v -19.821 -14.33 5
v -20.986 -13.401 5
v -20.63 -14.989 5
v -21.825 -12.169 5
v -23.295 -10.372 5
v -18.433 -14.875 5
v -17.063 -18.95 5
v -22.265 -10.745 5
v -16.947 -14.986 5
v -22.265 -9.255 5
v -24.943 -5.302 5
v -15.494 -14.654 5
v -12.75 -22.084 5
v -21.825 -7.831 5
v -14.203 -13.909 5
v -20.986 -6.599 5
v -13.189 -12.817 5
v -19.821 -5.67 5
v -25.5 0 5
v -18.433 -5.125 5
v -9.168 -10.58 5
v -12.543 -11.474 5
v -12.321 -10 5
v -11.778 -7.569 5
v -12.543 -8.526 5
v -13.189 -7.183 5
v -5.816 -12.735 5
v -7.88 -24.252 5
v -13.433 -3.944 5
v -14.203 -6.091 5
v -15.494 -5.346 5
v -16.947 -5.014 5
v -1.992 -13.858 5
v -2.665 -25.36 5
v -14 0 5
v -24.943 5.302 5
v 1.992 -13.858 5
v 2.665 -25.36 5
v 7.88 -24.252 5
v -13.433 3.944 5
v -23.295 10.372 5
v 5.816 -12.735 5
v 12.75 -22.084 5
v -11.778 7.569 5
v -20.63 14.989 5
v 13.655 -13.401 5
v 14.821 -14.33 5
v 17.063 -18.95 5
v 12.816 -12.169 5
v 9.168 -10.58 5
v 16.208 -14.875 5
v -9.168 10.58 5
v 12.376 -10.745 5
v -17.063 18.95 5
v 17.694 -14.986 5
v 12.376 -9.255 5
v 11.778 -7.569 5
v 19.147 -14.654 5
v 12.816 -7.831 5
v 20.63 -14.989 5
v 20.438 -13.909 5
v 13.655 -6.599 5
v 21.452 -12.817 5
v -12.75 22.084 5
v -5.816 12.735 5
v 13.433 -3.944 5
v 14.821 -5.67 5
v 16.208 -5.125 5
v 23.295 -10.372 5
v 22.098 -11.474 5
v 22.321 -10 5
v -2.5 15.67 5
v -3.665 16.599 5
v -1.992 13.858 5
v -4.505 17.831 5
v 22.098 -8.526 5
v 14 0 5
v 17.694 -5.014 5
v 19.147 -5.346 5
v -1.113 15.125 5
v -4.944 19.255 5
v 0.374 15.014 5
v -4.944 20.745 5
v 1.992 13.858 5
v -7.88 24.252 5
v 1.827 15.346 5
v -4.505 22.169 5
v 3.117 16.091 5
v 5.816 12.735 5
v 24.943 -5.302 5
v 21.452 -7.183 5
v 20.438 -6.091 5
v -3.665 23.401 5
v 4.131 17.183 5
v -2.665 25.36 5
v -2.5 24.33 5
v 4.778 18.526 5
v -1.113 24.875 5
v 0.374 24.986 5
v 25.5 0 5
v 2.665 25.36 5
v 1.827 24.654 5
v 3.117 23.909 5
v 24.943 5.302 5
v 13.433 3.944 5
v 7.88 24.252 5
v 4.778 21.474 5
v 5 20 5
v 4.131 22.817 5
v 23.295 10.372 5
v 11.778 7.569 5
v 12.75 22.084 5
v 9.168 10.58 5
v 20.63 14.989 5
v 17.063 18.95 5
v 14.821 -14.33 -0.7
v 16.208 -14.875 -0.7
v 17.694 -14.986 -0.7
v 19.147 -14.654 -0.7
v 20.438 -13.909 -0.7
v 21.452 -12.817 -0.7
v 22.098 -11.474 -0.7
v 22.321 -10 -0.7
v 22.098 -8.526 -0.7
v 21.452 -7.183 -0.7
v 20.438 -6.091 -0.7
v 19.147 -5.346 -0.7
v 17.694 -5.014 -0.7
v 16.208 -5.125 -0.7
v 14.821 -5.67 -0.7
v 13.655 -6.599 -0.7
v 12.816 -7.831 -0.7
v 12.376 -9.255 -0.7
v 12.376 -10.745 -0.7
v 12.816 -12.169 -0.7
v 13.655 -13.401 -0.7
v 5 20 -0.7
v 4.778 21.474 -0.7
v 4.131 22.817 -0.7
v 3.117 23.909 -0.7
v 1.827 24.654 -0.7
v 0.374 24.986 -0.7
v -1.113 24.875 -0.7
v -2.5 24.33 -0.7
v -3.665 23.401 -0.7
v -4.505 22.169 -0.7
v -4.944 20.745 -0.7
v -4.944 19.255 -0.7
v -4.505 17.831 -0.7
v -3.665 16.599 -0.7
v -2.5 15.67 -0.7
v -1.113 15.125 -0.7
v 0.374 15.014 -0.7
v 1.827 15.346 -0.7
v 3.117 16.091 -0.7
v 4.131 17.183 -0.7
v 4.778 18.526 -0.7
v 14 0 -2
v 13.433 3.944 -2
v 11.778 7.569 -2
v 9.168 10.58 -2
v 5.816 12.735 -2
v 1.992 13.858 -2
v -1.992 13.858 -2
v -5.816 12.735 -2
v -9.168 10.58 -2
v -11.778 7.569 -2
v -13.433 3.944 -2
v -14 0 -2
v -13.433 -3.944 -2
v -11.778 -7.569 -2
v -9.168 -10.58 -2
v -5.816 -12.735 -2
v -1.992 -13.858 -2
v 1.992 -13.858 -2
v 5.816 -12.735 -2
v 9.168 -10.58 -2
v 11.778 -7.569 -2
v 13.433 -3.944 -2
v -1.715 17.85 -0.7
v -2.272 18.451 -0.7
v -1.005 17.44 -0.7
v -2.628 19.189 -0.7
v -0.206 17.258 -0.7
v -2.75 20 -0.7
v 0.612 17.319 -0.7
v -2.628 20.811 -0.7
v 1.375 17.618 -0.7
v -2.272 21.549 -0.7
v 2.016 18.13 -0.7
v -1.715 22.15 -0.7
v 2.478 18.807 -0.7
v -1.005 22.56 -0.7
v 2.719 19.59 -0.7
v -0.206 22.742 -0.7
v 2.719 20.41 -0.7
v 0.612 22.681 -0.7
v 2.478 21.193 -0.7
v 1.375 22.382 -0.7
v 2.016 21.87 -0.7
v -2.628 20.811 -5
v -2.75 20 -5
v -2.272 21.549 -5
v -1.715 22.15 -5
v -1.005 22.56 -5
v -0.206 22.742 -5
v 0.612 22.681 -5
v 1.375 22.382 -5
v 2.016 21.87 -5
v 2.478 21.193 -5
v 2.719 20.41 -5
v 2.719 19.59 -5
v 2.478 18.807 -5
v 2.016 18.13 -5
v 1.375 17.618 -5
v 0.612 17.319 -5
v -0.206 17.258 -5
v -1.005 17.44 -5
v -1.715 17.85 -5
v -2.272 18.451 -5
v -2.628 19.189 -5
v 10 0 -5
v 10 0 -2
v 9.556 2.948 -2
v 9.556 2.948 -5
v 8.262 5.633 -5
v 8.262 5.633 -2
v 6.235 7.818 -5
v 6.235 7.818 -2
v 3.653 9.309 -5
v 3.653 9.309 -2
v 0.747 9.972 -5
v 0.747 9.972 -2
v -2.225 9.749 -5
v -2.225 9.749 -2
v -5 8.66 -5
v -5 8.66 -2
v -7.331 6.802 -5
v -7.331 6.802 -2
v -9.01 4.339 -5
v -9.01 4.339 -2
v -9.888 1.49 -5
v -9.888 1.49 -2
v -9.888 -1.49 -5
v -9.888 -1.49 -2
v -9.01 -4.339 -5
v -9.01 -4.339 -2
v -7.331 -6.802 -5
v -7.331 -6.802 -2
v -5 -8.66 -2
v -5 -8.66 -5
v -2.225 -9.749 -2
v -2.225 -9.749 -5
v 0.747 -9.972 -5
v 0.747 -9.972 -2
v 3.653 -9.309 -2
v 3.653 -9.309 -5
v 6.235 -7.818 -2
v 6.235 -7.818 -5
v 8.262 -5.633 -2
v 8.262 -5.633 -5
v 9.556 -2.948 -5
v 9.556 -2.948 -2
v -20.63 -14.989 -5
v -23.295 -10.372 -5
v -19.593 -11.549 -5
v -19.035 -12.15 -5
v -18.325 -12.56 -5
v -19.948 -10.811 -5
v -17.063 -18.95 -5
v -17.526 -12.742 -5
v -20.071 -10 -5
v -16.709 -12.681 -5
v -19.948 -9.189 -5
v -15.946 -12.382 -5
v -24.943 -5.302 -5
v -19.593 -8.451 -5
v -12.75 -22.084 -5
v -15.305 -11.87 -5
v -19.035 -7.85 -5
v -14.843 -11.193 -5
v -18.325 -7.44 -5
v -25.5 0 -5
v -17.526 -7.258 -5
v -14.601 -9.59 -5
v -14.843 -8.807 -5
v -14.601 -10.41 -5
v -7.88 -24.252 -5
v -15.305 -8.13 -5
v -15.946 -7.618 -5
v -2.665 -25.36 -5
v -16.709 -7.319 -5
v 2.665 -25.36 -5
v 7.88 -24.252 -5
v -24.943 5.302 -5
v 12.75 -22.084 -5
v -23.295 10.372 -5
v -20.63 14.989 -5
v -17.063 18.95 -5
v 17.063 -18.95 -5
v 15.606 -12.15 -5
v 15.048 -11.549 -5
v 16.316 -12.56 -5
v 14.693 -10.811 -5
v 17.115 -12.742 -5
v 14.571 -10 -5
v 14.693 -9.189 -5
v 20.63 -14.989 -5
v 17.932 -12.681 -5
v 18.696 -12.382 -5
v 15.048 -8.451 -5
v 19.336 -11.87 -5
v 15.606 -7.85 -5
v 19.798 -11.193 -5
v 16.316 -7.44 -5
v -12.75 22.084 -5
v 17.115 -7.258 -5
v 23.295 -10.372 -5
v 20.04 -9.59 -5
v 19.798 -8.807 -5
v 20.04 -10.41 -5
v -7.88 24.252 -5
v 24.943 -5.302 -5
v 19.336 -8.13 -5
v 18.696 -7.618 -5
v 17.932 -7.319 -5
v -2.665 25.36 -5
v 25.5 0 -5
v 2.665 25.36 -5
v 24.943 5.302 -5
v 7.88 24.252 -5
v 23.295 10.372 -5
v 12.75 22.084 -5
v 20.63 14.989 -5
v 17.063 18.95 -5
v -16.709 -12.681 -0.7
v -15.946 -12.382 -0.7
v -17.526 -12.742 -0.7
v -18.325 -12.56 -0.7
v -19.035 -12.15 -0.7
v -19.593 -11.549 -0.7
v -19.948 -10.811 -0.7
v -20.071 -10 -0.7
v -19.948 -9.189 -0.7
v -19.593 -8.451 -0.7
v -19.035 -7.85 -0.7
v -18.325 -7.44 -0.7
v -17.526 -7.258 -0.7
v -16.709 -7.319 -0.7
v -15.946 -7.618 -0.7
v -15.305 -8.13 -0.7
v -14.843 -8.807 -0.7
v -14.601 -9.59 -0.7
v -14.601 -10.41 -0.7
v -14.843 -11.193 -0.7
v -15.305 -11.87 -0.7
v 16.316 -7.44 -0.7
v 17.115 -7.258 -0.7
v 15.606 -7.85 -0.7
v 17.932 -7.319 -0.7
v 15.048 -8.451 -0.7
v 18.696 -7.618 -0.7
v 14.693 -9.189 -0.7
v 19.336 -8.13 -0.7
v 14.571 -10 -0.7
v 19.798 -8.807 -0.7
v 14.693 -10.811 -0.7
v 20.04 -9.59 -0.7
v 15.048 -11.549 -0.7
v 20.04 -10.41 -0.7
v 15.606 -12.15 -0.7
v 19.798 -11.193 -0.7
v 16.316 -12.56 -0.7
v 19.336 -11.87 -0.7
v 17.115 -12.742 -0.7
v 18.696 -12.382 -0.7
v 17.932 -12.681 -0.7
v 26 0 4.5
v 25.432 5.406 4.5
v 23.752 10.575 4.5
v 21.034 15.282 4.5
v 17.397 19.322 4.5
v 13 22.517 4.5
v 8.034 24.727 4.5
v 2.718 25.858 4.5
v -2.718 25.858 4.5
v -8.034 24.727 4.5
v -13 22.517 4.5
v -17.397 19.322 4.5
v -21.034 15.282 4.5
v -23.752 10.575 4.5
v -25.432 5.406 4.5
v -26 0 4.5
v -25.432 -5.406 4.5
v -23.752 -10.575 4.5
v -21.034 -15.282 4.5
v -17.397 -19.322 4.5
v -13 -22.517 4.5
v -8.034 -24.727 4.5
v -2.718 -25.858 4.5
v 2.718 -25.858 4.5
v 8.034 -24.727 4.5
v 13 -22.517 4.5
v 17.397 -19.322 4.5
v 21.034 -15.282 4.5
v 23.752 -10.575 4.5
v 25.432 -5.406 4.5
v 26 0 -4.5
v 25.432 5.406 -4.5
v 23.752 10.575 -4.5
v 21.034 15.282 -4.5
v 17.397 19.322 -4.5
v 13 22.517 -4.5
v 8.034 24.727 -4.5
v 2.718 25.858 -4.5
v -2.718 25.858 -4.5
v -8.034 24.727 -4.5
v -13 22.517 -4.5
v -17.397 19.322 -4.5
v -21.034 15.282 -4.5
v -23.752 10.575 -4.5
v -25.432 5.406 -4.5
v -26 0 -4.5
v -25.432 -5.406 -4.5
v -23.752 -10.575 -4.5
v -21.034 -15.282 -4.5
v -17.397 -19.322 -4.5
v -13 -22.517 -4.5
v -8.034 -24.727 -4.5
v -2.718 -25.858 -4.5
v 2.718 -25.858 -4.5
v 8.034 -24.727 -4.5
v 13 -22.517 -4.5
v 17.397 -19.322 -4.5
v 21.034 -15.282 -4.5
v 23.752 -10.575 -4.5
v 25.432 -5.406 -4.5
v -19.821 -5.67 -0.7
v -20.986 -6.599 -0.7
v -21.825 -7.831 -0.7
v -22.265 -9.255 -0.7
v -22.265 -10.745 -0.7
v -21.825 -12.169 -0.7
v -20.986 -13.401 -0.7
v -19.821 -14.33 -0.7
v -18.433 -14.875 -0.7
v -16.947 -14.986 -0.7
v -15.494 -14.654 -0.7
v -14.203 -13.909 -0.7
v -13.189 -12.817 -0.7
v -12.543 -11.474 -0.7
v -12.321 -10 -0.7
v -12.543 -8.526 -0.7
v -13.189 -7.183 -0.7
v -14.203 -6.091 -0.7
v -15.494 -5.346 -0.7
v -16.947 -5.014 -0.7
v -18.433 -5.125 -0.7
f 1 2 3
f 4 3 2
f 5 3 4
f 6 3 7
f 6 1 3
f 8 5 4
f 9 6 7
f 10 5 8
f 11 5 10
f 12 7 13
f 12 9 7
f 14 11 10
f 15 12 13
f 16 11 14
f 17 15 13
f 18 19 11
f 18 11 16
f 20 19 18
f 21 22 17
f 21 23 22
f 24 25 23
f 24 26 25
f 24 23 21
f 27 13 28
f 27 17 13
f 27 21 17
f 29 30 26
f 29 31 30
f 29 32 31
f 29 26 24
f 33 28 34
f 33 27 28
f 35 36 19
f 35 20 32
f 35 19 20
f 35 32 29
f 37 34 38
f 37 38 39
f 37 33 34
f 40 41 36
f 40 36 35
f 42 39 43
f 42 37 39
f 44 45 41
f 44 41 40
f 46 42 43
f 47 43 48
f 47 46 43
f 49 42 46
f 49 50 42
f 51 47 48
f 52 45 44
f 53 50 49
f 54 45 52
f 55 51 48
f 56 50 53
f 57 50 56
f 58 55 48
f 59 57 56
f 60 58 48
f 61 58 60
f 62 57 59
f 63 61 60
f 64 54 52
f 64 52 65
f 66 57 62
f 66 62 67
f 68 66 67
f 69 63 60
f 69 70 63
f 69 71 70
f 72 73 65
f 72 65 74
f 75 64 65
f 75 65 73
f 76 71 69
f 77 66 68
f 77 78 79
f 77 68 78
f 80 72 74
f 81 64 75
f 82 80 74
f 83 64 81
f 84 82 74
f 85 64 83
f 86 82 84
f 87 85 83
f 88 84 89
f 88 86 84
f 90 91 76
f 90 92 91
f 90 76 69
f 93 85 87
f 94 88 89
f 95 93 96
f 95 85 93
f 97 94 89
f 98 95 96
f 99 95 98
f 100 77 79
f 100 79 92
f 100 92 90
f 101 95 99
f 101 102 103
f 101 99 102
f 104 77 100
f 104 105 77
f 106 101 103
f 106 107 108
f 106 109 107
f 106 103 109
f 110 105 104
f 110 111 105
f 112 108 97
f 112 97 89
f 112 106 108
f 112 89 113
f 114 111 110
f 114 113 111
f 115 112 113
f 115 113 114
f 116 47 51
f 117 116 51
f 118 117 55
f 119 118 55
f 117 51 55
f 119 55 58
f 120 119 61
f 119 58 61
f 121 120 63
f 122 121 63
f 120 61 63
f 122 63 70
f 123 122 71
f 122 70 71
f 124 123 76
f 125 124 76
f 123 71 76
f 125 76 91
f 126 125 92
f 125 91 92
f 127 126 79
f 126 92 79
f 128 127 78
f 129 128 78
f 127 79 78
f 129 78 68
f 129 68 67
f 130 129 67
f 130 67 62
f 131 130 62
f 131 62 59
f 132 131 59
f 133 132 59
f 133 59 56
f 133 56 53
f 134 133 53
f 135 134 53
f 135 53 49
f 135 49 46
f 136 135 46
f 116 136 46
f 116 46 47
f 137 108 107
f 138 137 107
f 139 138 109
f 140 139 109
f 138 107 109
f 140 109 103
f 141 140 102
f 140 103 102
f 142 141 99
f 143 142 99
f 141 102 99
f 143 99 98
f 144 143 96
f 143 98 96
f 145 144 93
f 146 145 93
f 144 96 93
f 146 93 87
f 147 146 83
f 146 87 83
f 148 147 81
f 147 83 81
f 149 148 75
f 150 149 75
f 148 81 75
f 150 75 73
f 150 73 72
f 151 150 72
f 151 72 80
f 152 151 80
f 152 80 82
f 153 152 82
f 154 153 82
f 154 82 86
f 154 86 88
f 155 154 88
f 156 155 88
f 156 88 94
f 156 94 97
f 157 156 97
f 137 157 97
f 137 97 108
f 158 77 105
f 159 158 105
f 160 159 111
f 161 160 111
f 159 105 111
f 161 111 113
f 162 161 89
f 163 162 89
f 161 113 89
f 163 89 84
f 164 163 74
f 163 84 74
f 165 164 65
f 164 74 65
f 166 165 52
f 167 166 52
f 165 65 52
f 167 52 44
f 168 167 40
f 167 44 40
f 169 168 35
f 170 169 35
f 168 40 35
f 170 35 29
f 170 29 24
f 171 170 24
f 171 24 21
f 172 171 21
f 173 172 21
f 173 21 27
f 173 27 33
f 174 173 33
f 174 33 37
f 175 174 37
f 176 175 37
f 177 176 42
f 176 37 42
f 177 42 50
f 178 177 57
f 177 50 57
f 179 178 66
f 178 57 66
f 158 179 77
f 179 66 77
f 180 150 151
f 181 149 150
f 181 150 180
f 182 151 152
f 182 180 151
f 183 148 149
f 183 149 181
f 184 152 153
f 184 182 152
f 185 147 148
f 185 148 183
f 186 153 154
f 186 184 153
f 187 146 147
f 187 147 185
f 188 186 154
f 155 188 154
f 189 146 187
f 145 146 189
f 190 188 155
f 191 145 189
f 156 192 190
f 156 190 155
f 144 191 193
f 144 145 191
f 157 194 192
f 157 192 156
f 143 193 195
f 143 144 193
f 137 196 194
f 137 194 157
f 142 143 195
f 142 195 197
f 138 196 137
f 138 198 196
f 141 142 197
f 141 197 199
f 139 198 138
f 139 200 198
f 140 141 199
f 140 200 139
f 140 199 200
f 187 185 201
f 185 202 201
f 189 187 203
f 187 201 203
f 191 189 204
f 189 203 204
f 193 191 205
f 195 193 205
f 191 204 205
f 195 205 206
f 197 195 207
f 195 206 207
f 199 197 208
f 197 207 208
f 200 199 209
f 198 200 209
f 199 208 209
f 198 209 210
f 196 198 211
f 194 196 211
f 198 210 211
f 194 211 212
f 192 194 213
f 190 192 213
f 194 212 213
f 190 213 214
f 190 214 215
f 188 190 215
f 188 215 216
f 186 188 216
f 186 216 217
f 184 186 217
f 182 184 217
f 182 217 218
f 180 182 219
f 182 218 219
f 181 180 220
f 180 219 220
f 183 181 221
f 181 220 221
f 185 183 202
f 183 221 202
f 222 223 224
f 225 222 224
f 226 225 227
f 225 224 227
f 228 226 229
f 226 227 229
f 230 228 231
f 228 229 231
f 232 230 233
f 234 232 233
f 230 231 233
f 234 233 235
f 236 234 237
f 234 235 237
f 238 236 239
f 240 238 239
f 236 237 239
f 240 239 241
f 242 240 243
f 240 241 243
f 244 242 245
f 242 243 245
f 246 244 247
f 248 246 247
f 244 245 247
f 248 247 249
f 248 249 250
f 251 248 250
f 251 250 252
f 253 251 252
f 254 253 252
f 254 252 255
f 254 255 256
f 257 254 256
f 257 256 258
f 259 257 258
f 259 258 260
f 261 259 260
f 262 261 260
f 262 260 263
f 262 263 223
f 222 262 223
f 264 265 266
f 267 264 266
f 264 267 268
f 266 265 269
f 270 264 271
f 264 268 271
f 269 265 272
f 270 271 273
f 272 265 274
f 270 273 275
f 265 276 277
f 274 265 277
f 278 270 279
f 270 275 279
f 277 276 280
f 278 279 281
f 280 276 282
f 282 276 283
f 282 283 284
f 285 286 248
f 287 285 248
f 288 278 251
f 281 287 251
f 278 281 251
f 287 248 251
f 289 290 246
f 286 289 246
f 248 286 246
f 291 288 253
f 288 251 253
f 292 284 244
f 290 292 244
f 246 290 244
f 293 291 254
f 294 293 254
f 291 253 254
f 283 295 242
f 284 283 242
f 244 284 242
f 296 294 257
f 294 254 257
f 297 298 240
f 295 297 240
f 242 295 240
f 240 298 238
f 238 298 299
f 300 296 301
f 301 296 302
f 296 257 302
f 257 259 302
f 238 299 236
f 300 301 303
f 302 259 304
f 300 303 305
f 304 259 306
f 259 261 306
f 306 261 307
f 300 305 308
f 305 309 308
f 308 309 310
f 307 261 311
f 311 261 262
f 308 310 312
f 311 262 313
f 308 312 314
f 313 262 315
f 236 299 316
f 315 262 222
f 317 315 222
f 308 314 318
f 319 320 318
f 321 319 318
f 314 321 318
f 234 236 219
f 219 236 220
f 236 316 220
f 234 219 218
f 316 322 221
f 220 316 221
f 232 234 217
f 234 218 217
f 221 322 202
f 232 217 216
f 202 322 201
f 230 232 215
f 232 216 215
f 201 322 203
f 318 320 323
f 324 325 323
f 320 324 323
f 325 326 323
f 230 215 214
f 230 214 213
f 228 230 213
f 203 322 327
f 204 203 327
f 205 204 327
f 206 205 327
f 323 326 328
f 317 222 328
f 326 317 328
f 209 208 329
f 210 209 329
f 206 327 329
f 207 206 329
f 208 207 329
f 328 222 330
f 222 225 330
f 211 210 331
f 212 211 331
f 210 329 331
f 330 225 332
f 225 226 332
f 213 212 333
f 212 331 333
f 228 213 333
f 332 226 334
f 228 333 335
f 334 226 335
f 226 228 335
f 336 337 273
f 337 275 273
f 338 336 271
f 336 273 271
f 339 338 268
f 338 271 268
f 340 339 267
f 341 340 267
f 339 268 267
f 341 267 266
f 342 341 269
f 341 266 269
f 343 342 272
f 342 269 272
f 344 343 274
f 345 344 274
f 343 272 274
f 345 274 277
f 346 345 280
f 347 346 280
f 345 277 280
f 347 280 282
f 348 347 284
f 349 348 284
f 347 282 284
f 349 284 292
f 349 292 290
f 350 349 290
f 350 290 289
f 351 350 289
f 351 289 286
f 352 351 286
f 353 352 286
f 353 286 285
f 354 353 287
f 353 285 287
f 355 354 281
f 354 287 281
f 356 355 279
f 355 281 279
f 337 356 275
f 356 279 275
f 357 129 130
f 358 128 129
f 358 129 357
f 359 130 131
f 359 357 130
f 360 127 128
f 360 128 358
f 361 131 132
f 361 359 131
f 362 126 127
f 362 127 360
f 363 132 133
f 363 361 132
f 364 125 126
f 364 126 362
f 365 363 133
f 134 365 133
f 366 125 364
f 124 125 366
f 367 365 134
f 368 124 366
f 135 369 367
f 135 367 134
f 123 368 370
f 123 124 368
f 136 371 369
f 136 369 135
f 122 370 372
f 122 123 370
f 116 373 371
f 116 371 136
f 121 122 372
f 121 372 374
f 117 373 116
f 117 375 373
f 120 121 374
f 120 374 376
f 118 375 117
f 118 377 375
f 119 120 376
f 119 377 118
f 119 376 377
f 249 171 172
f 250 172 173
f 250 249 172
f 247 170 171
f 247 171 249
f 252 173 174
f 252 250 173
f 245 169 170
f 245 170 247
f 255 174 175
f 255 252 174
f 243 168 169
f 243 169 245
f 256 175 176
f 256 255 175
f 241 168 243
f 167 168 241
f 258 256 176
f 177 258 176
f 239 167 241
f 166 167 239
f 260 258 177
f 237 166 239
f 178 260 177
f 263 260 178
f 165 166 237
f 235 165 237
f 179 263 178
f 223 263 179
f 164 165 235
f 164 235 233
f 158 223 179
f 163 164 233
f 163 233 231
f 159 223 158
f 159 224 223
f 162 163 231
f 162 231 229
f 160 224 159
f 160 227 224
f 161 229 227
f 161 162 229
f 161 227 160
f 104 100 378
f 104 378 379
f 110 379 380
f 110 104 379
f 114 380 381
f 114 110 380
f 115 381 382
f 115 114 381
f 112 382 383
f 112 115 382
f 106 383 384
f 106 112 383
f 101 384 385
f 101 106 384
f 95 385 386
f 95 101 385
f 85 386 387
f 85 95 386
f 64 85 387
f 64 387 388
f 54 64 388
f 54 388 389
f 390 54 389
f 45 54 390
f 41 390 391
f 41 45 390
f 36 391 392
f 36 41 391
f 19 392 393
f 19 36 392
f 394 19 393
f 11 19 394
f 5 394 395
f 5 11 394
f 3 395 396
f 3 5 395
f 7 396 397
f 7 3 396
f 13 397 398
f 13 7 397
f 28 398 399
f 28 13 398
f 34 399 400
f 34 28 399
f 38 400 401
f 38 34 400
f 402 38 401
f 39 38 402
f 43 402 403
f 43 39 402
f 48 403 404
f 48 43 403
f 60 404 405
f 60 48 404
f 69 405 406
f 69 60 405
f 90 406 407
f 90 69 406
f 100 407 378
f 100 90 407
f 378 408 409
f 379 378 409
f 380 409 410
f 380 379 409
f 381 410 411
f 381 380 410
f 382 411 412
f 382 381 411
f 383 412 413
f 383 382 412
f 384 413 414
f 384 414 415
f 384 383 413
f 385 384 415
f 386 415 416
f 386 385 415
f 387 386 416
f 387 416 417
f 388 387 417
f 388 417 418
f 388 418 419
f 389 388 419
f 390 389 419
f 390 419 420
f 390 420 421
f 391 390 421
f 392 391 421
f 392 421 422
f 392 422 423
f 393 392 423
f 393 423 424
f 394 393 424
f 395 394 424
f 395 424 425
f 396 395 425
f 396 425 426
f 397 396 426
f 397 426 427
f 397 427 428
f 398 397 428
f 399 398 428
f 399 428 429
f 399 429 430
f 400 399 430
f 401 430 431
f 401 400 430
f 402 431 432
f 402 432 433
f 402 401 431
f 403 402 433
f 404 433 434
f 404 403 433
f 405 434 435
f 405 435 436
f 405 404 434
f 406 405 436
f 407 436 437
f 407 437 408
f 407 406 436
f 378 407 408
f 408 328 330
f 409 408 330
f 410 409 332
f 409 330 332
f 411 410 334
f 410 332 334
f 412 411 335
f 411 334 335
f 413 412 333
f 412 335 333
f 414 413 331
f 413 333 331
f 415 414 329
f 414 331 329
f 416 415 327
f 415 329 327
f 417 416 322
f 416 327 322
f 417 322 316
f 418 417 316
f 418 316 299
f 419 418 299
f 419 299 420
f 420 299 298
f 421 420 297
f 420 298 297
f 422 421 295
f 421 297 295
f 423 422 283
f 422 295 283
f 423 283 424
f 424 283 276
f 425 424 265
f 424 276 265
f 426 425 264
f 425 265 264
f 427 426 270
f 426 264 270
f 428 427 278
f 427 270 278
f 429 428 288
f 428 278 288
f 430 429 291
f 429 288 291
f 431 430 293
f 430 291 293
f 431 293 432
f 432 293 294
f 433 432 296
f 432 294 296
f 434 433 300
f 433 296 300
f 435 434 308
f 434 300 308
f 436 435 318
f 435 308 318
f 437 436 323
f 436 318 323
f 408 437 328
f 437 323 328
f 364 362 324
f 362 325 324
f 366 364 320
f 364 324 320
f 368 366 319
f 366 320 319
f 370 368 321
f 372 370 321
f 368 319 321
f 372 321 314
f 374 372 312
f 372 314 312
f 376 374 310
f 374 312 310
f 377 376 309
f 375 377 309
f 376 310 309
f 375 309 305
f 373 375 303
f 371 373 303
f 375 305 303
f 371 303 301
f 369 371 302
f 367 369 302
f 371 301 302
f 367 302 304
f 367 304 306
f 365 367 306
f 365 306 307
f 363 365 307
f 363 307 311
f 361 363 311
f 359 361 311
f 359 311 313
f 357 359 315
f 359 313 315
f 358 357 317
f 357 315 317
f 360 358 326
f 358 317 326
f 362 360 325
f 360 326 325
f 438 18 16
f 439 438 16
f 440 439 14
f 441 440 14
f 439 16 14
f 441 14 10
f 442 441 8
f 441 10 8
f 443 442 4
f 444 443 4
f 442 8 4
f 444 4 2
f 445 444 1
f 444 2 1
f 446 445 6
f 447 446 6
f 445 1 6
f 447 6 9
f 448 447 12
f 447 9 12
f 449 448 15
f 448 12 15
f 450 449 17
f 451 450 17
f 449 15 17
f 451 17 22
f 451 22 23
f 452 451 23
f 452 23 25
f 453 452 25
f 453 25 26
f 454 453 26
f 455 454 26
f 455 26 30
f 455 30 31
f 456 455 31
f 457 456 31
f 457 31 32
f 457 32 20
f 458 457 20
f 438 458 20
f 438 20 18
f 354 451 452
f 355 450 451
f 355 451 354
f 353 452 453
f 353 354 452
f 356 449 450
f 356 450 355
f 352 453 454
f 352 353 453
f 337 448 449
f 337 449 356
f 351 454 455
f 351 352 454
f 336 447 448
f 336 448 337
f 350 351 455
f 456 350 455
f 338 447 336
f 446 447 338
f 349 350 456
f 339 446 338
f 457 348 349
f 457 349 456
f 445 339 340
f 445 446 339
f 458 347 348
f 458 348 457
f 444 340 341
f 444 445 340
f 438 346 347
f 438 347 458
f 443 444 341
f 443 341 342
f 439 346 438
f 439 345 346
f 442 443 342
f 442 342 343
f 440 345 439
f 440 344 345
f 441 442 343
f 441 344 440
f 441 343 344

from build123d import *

# Parameters (mm, degrees)
SKETCH_1_R                = 26
EXTRUDE_1_DEPTH           = 5
SKETCH_2_R                = 14
CUT_EXTRUDE_1_DEPTH       = 7
SKETCH_3_R                = 10
CUT_EXTRUDE_2_DEPTH       = 38.429934544
HOLE_WIZARD_1_D           = 5.5
HOLE_WIZARD_1_CBORE_D     = 10
HOLE_WIZARD_1_CBORE_DEPTH = 5.7
CHAMFER_1_SIZE            = 0.5
PATTERN_CIRCULAR_1_COUNT  = 3


with BuildPart() as part:
    # 草图1 → 凸台-拉伸1 (new, symmetric)
    with BuildSketch(Plane.XY):
        Circle(SKETCH_1_R)
    extrude(amount=EXTRUDE_1_DEPTH, both=True)

    # 草图2 → 切除-拉伸1 (cut)
    with BuildSketch(Plane.XY.offset(5)):
        Circle(SKETCH_2_R)
    extrude(amount=-CUT_EXTRUDE_1_DEPTH, mode=Mode.SUBTRACT)

    # 草图3 → 切除-拉伸2 (cut, through all)
    with BuildSketch(Plane.XY.offset(-2)):
        Circle(SKETCH_3_R)
    extrude(amount=-CUT_EXTRUDE_2_DEPTH, mode=Mode.SUBTRACT)

    # 打孔尺寸根据内六角圆柱头螺钉的类型1 (through all)
    with Locations(Plane.XY.offset(5)):
        with Locations((0, 20)):
            hole_wizard_1 = CounterBoreHole(HOLE_WIZARD_1_D / 2, HOLE_WIZARD_1_CBORE_D / 2, HOLE_WIZARD_1_CBORE_DEPTH)

    # 倒角1
    chamfer_1_edges = [part.edges().sort_by_distance(p)[0] for p in [
        (-26, 0, -5),
        (-26, 0, 5),
    ]]
    chamfer(chamfer_1_edges, length=CHAMFER_1_SIZE)

    # 阵列(圆周)1: 打孔尺寸根据内六角圆柱头螺钉的类型1 ×3 about axis
    pattern_circular_1_axis = Axis((0, 0, 0), (0, 0, 1))
    for i in range(1, PATTERN_CIRCULAR_1_COUNT):
        add(hole_wizard_1.rotate(pattern_circular_1_axis, i * 360 / PATTERN_CIRCULAR_1_COUNT), mode=Mode.SUBTRACT)


solid = part.part
